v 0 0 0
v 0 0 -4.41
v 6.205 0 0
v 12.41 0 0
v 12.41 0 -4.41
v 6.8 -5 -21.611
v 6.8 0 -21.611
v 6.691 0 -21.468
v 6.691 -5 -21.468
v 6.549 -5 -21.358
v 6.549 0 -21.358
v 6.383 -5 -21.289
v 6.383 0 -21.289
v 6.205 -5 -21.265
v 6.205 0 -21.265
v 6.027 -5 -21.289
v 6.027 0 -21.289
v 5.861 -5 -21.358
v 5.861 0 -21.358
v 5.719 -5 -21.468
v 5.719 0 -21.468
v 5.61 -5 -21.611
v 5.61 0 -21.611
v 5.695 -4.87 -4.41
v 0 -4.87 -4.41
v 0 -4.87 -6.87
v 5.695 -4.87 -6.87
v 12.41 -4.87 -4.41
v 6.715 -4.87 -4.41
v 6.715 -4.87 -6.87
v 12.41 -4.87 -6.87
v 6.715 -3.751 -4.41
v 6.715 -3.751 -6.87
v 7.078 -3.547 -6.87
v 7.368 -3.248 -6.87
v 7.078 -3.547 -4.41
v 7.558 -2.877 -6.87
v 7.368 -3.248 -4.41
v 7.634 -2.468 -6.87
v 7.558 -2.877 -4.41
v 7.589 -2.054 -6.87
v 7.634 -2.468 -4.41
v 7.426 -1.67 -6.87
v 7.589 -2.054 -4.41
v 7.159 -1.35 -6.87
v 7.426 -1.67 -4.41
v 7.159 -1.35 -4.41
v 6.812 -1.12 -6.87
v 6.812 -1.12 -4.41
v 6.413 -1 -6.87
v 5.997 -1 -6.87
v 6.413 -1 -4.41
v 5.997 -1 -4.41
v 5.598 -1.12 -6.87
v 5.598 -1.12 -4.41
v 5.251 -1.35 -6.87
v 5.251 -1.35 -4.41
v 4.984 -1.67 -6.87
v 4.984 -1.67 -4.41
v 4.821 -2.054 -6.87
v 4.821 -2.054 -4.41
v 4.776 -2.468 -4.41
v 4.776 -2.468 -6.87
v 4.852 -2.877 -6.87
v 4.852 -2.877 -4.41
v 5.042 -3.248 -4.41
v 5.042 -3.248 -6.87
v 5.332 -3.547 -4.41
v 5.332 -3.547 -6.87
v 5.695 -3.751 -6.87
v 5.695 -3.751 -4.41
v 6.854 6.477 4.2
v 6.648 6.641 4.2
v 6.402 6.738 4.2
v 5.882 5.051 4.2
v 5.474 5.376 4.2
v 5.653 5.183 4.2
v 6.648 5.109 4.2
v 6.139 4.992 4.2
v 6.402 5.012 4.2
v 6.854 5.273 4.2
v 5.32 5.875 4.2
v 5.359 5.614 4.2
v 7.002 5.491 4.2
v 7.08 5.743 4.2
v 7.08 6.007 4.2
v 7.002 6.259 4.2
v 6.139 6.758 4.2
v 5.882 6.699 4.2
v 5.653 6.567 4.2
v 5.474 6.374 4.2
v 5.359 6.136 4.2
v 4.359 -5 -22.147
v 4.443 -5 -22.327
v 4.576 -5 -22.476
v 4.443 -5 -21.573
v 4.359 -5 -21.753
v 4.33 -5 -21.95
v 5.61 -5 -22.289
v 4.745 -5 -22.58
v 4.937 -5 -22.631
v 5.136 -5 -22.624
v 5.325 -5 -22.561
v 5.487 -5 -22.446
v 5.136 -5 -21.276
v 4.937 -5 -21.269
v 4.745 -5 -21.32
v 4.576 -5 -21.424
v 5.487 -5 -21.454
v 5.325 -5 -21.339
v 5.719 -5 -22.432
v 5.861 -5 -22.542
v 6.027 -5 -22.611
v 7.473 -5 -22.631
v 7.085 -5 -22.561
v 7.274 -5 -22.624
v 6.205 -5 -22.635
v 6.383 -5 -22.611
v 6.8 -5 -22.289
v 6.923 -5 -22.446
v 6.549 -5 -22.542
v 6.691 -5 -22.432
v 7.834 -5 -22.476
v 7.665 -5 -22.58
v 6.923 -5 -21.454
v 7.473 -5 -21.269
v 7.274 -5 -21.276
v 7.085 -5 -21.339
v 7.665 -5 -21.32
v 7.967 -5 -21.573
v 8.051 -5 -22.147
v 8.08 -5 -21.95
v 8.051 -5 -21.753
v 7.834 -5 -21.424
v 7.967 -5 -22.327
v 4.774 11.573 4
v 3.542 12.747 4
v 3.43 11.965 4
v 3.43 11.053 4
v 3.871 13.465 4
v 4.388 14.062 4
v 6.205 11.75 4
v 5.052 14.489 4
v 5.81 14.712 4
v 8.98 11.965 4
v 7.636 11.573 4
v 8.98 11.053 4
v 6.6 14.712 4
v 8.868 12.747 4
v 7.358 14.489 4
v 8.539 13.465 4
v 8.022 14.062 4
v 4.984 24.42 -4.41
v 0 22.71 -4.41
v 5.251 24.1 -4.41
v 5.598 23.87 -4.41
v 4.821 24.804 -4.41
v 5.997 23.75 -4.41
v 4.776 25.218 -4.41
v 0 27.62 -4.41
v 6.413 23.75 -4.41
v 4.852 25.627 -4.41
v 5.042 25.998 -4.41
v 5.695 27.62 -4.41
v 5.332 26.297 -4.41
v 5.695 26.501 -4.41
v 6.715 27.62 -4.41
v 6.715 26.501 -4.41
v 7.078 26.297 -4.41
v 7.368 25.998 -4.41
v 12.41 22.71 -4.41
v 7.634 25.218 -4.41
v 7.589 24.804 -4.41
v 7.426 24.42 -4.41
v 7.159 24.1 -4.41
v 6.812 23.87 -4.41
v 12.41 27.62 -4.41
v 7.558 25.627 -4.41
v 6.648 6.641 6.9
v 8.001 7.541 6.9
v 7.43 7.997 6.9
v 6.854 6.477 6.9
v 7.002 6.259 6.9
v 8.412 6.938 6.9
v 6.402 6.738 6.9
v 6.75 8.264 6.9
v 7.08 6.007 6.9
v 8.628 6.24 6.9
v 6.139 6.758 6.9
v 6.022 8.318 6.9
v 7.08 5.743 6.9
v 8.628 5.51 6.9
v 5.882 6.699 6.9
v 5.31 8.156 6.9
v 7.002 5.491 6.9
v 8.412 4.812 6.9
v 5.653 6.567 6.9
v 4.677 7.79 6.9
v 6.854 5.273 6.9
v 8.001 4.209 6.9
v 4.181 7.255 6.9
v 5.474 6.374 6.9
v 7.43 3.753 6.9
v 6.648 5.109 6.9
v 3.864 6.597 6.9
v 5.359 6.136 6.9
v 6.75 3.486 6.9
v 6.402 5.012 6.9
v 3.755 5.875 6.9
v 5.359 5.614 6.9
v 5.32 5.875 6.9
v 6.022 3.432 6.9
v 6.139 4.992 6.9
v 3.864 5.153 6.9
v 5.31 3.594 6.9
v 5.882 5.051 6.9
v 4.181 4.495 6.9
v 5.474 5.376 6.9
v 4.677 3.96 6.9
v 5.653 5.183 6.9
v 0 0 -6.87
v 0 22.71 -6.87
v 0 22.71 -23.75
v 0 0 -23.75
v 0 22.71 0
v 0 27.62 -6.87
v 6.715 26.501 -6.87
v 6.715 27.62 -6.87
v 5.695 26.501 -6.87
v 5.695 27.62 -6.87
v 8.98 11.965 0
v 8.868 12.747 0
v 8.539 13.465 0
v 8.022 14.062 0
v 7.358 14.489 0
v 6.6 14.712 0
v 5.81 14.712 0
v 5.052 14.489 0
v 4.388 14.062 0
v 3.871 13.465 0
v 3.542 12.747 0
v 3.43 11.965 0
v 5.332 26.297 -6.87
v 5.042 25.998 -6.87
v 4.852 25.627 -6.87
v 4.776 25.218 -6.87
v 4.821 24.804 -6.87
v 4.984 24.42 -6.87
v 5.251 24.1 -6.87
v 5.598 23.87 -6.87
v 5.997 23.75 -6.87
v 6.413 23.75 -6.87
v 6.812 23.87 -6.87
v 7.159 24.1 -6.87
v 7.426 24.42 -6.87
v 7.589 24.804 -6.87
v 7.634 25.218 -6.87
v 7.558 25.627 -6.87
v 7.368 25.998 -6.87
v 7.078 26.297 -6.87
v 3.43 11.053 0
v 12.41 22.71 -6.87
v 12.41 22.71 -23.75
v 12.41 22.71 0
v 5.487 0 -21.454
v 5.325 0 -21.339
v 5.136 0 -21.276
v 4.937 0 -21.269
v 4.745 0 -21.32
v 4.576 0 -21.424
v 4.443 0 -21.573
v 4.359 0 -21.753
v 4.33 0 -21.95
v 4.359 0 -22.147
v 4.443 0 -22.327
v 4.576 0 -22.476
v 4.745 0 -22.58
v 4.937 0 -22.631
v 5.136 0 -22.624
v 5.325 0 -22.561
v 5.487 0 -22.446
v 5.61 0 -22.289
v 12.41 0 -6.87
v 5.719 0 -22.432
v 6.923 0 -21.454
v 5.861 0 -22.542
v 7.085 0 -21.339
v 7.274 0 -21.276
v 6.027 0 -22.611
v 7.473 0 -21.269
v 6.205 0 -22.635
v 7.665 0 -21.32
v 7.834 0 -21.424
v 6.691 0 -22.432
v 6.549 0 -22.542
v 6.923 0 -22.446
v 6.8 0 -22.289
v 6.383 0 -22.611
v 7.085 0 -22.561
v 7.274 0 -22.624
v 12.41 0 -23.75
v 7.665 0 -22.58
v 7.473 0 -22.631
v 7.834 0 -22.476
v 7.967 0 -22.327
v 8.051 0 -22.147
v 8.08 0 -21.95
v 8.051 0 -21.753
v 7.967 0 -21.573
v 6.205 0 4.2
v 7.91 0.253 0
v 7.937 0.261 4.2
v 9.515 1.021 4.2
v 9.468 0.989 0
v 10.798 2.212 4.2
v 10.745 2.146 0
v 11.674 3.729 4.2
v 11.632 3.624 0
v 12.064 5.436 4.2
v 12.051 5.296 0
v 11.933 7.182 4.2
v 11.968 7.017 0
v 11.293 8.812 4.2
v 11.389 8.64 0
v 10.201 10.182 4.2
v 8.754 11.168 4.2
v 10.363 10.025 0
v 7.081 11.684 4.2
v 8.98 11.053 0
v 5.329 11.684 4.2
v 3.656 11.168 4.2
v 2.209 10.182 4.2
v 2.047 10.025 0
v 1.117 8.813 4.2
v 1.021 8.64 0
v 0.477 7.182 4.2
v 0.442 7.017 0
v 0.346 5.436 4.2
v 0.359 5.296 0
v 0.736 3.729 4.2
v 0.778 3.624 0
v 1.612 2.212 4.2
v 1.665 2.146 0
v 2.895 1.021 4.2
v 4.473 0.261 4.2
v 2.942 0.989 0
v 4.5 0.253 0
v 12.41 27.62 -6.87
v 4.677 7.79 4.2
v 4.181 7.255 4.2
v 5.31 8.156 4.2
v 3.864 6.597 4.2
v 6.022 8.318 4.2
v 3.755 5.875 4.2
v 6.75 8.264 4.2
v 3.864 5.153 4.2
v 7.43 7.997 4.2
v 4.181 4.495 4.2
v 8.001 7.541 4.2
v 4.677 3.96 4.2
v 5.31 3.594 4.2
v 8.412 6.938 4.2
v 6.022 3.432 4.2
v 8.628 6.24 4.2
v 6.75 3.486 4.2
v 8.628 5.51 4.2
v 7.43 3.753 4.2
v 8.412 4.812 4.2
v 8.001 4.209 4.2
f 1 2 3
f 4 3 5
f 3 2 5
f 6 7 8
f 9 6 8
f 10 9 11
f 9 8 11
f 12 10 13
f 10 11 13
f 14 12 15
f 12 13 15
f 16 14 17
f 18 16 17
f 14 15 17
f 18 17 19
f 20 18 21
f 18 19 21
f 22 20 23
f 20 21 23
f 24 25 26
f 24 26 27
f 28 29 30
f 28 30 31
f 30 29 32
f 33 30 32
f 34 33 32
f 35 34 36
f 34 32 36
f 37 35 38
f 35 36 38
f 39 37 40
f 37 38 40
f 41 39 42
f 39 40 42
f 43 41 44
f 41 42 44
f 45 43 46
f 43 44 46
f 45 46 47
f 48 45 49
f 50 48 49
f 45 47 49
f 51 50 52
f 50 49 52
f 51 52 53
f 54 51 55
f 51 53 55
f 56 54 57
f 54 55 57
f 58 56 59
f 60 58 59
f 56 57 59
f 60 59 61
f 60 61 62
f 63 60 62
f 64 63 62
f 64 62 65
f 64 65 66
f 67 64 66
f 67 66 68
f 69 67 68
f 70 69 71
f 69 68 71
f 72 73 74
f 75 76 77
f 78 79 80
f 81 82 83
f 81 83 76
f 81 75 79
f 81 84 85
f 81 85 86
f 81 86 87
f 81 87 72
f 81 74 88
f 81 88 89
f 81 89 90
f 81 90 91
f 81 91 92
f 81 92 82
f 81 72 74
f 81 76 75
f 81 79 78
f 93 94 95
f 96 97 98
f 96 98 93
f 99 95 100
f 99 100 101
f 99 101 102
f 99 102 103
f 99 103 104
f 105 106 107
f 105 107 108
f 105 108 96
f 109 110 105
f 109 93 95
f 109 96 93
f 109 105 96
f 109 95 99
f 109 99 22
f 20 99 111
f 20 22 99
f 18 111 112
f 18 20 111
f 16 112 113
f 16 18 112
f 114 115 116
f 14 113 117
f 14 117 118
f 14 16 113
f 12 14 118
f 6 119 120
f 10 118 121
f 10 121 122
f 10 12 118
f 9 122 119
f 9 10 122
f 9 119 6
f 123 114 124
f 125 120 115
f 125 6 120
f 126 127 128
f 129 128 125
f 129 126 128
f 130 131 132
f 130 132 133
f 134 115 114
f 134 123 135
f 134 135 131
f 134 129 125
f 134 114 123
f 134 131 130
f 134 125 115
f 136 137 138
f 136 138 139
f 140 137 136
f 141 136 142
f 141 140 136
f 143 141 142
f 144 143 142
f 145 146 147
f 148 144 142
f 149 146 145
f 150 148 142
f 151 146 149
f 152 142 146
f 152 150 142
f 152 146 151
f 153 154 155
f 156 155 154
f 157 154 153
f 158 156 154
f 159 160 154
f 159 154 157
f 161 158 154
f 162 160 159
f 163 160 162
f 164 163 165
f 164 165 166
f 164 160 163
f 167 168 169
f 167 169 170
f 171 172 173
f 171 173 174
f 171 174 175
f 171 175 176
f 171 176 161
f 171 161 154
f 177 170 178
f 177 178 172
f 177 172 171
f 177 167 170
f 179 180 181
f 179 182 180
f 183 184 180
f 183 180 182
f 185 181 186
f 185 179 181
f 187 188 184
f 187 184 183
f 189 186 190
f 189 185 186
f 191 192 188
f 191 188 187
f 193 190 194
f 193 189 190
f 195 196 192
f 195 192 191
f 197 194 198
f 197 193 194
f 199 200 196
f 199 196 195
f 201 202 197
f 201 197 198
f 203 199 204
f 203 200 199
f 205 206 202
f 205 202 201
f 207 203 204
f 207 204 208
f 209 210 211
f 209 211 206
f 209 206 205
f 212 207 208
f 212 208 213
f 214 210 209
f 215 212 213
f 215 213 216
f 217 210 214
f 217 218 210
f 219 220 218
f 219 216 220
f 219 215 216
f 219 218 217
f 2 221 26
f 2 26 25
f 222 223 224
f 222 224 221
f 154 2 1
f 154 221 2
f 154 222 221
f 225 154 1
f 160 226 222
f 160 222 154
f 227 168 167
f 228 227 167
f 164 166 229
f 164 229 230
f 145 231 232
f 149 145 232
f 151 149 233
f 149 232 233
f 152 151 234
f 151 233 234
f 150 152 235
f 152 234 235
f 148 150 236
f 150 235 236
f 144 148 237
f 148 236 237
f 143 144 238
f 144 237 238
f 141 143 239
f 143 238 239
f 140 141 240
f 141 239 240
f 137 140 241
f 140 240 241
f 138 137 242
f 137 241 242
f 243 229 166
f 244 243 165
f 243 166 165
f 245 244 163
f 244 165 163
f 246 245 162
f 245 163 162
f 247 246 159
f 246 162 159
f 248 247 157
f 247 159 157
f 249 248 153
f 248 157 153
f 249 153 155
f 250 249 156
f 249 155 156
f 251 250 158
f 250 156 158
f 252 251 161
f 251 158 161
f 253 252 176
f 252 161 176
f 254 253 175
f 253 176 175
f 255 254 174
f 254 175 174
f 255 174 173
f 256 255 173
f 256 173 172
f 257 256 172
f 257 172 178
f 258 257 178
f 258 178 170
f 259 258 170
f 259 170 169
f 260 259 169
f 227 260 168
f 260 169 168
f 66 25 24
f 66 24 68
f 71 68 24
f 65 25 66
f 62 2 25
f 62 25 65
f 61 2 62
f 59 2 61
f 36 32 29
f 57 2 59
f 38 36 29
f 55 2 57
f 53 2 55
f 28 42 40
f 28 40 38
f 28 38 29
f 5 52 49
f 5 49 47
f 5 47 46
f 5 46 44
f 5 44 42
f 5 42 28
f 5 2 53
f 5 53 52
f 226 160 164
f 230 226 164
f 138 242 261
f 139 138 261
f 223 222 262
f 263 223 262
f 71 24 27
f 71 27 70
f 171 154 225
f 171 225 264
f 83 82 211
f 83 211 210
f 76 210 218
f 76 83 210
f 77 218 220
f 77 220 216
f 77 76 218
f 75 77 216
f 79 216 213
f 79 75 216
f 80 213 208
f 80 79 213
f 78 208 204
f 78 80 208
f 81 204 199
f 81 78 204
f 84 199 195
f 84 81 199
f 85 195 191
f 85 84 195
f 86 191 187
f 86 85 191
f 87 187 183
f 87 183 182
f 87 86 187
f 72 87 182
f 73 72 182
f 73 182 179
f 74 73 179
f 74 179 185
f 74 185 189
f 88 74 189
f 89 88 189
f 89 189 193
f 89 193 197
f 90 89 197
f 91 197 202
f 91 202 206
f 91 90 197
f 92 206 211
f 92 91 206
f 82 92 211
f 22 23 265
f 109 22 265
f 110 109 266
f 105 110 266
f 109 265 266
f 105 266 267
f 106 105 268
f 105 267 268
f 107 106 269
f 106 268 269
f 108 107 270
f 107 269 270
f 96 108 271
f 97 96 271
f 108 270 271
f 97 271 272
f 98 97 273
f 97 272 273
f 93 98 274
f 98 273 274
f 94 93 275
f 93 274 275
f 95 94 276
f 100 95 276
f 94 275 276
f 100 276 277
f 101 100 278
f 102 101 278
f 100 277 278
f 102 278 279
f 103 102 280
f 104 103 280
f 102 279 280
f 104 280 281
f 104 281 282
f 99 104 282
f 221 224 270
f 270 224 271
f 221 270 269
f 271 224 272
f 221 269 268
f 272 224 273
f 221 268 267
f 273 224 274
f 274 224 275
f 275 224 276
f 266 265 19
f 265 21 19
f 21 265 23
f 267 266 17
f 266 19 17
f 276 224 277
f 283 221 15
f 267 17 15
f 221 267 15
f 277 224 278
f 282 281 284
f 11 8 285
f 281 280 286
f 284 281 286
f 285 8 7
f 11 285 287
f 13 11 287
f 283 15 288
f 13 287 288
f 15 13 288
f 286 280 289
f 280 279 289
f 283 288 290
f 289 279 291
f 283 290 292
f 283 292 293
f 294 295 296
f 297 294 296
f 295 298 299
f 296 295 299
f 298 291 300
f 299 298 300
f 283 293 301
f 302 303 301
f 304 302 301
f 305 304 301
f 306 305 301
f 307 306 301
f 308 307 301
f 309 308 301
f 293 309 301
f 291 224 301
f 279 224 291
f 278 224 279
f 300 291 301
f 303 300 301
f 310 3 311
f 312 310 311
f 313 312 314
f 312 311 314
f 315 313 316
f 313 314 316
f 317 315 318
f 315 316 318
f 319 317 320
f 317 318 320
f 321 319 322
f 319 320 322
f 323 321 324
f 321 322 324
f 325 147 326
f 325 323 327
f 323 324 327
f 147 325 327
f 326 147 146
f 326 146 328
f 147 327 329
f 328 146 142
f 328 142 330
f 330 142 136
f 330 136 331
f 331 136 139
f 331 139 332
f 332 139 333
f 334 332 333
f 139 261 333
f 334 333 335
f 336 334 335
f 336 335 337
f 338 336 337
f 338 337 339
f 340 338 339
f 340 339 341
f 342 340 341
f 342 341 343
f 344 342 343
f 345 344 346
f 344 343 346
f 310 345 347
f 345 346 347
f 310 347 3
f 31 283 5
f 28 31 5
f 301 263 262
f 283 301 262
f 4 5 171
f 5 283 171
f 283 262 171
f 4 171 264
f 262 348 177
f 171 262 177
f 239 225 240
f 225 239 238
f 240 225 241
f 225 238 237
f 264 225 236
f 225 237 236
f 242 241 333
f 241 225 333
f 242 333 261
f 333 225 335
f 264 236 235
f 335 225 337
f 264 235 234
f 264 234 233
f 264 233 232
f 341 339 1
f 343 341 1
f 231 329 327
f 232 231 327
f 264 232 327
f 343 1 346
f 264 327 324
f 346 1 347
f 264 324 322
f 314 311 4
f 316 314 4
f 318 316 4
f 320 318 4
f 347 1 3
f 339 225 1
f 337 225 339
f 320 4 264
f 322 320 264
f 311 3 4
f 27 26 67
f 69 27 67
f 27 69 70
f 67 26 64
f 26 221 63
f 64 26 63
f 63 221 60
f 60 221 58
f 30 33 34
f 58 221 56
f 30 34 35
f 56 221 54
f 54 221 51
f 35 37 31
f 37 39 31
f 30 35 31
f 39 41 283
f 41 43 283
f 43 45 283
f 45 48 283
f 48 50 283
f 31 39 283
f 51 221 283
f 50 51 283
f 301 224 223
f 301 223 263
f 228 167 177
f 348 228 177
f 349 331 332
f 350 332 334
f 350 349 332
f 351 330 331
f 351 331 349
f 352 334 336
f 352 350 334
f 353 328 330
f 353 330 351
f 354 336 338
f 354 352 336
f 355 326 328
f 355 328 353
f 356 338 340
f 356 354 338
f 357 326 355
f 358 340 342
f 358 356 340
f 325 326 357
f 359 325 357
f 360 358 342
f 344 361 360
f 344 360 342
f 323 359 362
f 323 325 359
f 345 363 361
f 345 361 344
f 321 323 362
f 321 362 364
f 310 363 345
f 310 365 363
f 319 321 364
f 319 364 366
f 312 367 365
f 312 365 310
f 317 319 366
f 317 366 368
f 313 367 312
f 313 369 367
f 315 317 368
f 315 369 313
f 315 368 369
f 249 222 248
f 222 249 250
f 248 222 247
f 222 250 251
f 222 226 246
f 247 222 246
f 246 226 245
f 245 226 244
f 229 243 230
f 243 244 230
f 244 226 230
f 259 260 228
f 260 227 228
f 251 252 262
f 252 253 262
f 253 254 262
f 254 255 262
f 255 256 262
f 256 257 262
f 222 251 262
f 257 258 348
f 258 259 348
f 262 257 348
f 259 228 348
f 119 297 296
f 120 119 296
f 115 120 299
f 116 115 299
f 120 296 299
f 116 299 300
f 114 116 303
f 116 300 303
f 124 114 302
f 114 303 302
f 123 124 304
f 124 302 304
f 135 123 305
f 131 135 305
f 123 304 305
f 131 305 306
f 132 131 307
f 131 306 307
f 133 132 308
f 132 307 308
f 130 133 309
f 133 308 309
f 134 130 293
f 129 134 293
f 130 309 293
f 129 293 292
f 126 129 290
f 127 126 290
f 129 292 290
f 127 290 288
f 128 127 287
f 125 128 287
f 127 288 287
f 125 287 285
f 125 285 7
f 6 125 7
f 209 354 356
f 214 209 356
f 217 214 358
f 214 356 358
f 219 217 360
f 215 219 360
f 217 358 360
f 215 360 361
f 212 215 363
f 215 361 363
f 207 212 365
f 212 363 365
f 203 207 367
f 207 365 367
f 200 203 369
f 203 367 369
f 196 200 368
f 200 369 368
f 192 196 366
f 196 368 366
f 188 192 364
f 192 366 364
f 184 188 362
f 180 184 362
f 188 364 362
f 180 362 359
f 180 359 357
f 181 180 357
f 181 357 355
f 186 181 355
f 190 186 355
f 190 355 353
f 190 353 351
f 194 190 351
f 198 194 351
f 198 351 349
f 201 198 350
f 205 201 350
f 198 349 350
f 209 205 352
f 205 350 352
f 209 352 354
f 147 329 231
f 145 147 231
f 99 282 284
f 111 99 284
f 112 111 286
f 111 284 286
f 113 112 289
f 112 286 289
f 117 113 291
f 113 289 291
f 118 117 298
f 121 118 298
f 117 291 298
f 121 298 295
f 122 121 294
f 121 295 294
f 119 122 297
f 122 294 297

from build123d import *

# Parameters (mm, degrees)
SKETCH1_W                = 12.41
SKETCH1_H                = 23.75
BOSS_EXTRUDE1_DEPTH      = 22.71
SKETCH2_R                = 5.875
BOSS_EXTRUDE3_DEPTH      = 4.2
BOSS_EXTRUDE4_DEPTH      = 4
BOSS_EXTRUDE5_DEPTH      = 4.87
BOSS_EXTRUDE5_DEPTH_BACK = 27.62
SKETCH6_W                = 12.41
SKETCH6_H                = 2.46
SKETCH8_R                = 1.43
CUT_EXTRUDE1_DEPTH       = 36.929209565
SKETCH9_W                = 1.02
SKETCH9_H                = 2.455
CUT_EXTRUDE2_DEPTH       = 36.929209565
SKETCH10_R               = 2.45
SKETCH10_R_2             = 0.885
BOSS_EXTRUDE7_DEPTH      = 2.7
BOSS_EXTRUDE8_DEPTH      = 5


with BuildPart() as part:
    # Sketch1 → Boss-Extrude1 (new body)
    with BuildSketch(Plane(origin=(0, 0, 0), x_dir=(1, 0, 0), z_dir=(0, 1, 0))):
        with Locations((6.205, 11.875)):
            Rectangle(SKETCH1_W, SKETCH1_H)
    extrude(amount=BOSS_EXTRUDE1_DEPTH)

    # Sketch2 → Boss-Extrude3 (add)
    with BuildSketch(Plane.XY):
        with Locations((6.205, 5.875)):
            Circle(SKETCH2_R)
    extrude(amount=BOSS_EXTRUDE3_DEPTH)

    # Sketch4 → Boss-Extrude4 (add)
    with BuildSketch(Plane.XY):
        with BuildLine():
            Line((3.43, 11.965), (3.43, 11.053320191))
            Line((3.43, 11.053320191), (8.98, 11.053320191))
            Line((8.98, 11.053320191), (8.98, 11.965))
            ThreePointArc((8.98, 11.965), (6.205, 14.74), (3.43, 11.965))
        make_face()
    extrude(amount=BOSS_EXTRUDE4_DEPTH)

    # Sketch6 → Boss-Extrude5 (add, two sides: drawn at the far end of the back side and taken through both)
    with BuildSketch(Plane.XZ.offset(-BOSS_EXTRUDE5_DEPTH_BACK)):
        with Locations((6.205, -5.64)):
            Rectangle(SKETCH6_W, SKETCH6_H)
    extrude(amount=BOSS_EXTRUDE5_DEPTH + BOSS_EXTRUDE5_DEPTH_BACK)

    # Sketch8 → Cut-Extrude1 (cut, through all)
    with BuildSketch(Plane.XY.offset(-4.41)):
        with Locations((6.205, 25.165)):
            Circle(SKETCH8_R)
        with Locations((6.205, -2.415)):
            Circle(SKETCH8_R)
    extrude(amount=-CUT_EXTRUDE1_DEPTH, mode=Mode.SUBTRACT)

    # Sketch9 → Cut-Extrude2 (cut, through all)
    with BuildSketch(Plane.XY.offset(-4.41)):
        with Locations((6.205, 26.3925)):
            Rectangle(SKETCH9_W, SKETCH9_H)
        with Locations((6.205, -3.6425)):
            Rectangle(SKETCH9_W, SKETCH9_H)
    extrude(amount=-CUT_EXTRUDE2_DEPTH, mode=Mode.SUBTRACT)

    # Sketch10 → Boss-Extrude7 (add)
    with BuildSketch(Plane.XY.offset(4.2)):
        with Locations((6.205, 5.875)):
            Circle(SKETCH10_R)
        with Locations((6.205, 5.875)):
            Circle(SKETCH10_R_2, mode=Mode.SUBTRACT)
    extrude(amount=BOSS_EXTRUDE7_DEPTH)

    # Sketch12 → Boss-Extrude8 (add)
    with BuildSketch(Plane.XZ):
        with BuildLine():
            ThreePointArc((5.61, -22.289411255), (6.205, -22.635), (6.8, -22.289411255))
            ThreePointArc((6.8, -22.289411255), (8.08, -21.95), (6.8, -21.610588745))
            ThreePointArc((6.8, -21.610588745), (6.205, -21.265), (5.61, -21.610588745))
            ThreePointArc((5.61, -21.610588745), (4.33, -21.95), (5.61, -22.289411255))
        make_face()
    extrude(amount=BOSS_EXTRUDE8_DEPTH)


solid = part.part
